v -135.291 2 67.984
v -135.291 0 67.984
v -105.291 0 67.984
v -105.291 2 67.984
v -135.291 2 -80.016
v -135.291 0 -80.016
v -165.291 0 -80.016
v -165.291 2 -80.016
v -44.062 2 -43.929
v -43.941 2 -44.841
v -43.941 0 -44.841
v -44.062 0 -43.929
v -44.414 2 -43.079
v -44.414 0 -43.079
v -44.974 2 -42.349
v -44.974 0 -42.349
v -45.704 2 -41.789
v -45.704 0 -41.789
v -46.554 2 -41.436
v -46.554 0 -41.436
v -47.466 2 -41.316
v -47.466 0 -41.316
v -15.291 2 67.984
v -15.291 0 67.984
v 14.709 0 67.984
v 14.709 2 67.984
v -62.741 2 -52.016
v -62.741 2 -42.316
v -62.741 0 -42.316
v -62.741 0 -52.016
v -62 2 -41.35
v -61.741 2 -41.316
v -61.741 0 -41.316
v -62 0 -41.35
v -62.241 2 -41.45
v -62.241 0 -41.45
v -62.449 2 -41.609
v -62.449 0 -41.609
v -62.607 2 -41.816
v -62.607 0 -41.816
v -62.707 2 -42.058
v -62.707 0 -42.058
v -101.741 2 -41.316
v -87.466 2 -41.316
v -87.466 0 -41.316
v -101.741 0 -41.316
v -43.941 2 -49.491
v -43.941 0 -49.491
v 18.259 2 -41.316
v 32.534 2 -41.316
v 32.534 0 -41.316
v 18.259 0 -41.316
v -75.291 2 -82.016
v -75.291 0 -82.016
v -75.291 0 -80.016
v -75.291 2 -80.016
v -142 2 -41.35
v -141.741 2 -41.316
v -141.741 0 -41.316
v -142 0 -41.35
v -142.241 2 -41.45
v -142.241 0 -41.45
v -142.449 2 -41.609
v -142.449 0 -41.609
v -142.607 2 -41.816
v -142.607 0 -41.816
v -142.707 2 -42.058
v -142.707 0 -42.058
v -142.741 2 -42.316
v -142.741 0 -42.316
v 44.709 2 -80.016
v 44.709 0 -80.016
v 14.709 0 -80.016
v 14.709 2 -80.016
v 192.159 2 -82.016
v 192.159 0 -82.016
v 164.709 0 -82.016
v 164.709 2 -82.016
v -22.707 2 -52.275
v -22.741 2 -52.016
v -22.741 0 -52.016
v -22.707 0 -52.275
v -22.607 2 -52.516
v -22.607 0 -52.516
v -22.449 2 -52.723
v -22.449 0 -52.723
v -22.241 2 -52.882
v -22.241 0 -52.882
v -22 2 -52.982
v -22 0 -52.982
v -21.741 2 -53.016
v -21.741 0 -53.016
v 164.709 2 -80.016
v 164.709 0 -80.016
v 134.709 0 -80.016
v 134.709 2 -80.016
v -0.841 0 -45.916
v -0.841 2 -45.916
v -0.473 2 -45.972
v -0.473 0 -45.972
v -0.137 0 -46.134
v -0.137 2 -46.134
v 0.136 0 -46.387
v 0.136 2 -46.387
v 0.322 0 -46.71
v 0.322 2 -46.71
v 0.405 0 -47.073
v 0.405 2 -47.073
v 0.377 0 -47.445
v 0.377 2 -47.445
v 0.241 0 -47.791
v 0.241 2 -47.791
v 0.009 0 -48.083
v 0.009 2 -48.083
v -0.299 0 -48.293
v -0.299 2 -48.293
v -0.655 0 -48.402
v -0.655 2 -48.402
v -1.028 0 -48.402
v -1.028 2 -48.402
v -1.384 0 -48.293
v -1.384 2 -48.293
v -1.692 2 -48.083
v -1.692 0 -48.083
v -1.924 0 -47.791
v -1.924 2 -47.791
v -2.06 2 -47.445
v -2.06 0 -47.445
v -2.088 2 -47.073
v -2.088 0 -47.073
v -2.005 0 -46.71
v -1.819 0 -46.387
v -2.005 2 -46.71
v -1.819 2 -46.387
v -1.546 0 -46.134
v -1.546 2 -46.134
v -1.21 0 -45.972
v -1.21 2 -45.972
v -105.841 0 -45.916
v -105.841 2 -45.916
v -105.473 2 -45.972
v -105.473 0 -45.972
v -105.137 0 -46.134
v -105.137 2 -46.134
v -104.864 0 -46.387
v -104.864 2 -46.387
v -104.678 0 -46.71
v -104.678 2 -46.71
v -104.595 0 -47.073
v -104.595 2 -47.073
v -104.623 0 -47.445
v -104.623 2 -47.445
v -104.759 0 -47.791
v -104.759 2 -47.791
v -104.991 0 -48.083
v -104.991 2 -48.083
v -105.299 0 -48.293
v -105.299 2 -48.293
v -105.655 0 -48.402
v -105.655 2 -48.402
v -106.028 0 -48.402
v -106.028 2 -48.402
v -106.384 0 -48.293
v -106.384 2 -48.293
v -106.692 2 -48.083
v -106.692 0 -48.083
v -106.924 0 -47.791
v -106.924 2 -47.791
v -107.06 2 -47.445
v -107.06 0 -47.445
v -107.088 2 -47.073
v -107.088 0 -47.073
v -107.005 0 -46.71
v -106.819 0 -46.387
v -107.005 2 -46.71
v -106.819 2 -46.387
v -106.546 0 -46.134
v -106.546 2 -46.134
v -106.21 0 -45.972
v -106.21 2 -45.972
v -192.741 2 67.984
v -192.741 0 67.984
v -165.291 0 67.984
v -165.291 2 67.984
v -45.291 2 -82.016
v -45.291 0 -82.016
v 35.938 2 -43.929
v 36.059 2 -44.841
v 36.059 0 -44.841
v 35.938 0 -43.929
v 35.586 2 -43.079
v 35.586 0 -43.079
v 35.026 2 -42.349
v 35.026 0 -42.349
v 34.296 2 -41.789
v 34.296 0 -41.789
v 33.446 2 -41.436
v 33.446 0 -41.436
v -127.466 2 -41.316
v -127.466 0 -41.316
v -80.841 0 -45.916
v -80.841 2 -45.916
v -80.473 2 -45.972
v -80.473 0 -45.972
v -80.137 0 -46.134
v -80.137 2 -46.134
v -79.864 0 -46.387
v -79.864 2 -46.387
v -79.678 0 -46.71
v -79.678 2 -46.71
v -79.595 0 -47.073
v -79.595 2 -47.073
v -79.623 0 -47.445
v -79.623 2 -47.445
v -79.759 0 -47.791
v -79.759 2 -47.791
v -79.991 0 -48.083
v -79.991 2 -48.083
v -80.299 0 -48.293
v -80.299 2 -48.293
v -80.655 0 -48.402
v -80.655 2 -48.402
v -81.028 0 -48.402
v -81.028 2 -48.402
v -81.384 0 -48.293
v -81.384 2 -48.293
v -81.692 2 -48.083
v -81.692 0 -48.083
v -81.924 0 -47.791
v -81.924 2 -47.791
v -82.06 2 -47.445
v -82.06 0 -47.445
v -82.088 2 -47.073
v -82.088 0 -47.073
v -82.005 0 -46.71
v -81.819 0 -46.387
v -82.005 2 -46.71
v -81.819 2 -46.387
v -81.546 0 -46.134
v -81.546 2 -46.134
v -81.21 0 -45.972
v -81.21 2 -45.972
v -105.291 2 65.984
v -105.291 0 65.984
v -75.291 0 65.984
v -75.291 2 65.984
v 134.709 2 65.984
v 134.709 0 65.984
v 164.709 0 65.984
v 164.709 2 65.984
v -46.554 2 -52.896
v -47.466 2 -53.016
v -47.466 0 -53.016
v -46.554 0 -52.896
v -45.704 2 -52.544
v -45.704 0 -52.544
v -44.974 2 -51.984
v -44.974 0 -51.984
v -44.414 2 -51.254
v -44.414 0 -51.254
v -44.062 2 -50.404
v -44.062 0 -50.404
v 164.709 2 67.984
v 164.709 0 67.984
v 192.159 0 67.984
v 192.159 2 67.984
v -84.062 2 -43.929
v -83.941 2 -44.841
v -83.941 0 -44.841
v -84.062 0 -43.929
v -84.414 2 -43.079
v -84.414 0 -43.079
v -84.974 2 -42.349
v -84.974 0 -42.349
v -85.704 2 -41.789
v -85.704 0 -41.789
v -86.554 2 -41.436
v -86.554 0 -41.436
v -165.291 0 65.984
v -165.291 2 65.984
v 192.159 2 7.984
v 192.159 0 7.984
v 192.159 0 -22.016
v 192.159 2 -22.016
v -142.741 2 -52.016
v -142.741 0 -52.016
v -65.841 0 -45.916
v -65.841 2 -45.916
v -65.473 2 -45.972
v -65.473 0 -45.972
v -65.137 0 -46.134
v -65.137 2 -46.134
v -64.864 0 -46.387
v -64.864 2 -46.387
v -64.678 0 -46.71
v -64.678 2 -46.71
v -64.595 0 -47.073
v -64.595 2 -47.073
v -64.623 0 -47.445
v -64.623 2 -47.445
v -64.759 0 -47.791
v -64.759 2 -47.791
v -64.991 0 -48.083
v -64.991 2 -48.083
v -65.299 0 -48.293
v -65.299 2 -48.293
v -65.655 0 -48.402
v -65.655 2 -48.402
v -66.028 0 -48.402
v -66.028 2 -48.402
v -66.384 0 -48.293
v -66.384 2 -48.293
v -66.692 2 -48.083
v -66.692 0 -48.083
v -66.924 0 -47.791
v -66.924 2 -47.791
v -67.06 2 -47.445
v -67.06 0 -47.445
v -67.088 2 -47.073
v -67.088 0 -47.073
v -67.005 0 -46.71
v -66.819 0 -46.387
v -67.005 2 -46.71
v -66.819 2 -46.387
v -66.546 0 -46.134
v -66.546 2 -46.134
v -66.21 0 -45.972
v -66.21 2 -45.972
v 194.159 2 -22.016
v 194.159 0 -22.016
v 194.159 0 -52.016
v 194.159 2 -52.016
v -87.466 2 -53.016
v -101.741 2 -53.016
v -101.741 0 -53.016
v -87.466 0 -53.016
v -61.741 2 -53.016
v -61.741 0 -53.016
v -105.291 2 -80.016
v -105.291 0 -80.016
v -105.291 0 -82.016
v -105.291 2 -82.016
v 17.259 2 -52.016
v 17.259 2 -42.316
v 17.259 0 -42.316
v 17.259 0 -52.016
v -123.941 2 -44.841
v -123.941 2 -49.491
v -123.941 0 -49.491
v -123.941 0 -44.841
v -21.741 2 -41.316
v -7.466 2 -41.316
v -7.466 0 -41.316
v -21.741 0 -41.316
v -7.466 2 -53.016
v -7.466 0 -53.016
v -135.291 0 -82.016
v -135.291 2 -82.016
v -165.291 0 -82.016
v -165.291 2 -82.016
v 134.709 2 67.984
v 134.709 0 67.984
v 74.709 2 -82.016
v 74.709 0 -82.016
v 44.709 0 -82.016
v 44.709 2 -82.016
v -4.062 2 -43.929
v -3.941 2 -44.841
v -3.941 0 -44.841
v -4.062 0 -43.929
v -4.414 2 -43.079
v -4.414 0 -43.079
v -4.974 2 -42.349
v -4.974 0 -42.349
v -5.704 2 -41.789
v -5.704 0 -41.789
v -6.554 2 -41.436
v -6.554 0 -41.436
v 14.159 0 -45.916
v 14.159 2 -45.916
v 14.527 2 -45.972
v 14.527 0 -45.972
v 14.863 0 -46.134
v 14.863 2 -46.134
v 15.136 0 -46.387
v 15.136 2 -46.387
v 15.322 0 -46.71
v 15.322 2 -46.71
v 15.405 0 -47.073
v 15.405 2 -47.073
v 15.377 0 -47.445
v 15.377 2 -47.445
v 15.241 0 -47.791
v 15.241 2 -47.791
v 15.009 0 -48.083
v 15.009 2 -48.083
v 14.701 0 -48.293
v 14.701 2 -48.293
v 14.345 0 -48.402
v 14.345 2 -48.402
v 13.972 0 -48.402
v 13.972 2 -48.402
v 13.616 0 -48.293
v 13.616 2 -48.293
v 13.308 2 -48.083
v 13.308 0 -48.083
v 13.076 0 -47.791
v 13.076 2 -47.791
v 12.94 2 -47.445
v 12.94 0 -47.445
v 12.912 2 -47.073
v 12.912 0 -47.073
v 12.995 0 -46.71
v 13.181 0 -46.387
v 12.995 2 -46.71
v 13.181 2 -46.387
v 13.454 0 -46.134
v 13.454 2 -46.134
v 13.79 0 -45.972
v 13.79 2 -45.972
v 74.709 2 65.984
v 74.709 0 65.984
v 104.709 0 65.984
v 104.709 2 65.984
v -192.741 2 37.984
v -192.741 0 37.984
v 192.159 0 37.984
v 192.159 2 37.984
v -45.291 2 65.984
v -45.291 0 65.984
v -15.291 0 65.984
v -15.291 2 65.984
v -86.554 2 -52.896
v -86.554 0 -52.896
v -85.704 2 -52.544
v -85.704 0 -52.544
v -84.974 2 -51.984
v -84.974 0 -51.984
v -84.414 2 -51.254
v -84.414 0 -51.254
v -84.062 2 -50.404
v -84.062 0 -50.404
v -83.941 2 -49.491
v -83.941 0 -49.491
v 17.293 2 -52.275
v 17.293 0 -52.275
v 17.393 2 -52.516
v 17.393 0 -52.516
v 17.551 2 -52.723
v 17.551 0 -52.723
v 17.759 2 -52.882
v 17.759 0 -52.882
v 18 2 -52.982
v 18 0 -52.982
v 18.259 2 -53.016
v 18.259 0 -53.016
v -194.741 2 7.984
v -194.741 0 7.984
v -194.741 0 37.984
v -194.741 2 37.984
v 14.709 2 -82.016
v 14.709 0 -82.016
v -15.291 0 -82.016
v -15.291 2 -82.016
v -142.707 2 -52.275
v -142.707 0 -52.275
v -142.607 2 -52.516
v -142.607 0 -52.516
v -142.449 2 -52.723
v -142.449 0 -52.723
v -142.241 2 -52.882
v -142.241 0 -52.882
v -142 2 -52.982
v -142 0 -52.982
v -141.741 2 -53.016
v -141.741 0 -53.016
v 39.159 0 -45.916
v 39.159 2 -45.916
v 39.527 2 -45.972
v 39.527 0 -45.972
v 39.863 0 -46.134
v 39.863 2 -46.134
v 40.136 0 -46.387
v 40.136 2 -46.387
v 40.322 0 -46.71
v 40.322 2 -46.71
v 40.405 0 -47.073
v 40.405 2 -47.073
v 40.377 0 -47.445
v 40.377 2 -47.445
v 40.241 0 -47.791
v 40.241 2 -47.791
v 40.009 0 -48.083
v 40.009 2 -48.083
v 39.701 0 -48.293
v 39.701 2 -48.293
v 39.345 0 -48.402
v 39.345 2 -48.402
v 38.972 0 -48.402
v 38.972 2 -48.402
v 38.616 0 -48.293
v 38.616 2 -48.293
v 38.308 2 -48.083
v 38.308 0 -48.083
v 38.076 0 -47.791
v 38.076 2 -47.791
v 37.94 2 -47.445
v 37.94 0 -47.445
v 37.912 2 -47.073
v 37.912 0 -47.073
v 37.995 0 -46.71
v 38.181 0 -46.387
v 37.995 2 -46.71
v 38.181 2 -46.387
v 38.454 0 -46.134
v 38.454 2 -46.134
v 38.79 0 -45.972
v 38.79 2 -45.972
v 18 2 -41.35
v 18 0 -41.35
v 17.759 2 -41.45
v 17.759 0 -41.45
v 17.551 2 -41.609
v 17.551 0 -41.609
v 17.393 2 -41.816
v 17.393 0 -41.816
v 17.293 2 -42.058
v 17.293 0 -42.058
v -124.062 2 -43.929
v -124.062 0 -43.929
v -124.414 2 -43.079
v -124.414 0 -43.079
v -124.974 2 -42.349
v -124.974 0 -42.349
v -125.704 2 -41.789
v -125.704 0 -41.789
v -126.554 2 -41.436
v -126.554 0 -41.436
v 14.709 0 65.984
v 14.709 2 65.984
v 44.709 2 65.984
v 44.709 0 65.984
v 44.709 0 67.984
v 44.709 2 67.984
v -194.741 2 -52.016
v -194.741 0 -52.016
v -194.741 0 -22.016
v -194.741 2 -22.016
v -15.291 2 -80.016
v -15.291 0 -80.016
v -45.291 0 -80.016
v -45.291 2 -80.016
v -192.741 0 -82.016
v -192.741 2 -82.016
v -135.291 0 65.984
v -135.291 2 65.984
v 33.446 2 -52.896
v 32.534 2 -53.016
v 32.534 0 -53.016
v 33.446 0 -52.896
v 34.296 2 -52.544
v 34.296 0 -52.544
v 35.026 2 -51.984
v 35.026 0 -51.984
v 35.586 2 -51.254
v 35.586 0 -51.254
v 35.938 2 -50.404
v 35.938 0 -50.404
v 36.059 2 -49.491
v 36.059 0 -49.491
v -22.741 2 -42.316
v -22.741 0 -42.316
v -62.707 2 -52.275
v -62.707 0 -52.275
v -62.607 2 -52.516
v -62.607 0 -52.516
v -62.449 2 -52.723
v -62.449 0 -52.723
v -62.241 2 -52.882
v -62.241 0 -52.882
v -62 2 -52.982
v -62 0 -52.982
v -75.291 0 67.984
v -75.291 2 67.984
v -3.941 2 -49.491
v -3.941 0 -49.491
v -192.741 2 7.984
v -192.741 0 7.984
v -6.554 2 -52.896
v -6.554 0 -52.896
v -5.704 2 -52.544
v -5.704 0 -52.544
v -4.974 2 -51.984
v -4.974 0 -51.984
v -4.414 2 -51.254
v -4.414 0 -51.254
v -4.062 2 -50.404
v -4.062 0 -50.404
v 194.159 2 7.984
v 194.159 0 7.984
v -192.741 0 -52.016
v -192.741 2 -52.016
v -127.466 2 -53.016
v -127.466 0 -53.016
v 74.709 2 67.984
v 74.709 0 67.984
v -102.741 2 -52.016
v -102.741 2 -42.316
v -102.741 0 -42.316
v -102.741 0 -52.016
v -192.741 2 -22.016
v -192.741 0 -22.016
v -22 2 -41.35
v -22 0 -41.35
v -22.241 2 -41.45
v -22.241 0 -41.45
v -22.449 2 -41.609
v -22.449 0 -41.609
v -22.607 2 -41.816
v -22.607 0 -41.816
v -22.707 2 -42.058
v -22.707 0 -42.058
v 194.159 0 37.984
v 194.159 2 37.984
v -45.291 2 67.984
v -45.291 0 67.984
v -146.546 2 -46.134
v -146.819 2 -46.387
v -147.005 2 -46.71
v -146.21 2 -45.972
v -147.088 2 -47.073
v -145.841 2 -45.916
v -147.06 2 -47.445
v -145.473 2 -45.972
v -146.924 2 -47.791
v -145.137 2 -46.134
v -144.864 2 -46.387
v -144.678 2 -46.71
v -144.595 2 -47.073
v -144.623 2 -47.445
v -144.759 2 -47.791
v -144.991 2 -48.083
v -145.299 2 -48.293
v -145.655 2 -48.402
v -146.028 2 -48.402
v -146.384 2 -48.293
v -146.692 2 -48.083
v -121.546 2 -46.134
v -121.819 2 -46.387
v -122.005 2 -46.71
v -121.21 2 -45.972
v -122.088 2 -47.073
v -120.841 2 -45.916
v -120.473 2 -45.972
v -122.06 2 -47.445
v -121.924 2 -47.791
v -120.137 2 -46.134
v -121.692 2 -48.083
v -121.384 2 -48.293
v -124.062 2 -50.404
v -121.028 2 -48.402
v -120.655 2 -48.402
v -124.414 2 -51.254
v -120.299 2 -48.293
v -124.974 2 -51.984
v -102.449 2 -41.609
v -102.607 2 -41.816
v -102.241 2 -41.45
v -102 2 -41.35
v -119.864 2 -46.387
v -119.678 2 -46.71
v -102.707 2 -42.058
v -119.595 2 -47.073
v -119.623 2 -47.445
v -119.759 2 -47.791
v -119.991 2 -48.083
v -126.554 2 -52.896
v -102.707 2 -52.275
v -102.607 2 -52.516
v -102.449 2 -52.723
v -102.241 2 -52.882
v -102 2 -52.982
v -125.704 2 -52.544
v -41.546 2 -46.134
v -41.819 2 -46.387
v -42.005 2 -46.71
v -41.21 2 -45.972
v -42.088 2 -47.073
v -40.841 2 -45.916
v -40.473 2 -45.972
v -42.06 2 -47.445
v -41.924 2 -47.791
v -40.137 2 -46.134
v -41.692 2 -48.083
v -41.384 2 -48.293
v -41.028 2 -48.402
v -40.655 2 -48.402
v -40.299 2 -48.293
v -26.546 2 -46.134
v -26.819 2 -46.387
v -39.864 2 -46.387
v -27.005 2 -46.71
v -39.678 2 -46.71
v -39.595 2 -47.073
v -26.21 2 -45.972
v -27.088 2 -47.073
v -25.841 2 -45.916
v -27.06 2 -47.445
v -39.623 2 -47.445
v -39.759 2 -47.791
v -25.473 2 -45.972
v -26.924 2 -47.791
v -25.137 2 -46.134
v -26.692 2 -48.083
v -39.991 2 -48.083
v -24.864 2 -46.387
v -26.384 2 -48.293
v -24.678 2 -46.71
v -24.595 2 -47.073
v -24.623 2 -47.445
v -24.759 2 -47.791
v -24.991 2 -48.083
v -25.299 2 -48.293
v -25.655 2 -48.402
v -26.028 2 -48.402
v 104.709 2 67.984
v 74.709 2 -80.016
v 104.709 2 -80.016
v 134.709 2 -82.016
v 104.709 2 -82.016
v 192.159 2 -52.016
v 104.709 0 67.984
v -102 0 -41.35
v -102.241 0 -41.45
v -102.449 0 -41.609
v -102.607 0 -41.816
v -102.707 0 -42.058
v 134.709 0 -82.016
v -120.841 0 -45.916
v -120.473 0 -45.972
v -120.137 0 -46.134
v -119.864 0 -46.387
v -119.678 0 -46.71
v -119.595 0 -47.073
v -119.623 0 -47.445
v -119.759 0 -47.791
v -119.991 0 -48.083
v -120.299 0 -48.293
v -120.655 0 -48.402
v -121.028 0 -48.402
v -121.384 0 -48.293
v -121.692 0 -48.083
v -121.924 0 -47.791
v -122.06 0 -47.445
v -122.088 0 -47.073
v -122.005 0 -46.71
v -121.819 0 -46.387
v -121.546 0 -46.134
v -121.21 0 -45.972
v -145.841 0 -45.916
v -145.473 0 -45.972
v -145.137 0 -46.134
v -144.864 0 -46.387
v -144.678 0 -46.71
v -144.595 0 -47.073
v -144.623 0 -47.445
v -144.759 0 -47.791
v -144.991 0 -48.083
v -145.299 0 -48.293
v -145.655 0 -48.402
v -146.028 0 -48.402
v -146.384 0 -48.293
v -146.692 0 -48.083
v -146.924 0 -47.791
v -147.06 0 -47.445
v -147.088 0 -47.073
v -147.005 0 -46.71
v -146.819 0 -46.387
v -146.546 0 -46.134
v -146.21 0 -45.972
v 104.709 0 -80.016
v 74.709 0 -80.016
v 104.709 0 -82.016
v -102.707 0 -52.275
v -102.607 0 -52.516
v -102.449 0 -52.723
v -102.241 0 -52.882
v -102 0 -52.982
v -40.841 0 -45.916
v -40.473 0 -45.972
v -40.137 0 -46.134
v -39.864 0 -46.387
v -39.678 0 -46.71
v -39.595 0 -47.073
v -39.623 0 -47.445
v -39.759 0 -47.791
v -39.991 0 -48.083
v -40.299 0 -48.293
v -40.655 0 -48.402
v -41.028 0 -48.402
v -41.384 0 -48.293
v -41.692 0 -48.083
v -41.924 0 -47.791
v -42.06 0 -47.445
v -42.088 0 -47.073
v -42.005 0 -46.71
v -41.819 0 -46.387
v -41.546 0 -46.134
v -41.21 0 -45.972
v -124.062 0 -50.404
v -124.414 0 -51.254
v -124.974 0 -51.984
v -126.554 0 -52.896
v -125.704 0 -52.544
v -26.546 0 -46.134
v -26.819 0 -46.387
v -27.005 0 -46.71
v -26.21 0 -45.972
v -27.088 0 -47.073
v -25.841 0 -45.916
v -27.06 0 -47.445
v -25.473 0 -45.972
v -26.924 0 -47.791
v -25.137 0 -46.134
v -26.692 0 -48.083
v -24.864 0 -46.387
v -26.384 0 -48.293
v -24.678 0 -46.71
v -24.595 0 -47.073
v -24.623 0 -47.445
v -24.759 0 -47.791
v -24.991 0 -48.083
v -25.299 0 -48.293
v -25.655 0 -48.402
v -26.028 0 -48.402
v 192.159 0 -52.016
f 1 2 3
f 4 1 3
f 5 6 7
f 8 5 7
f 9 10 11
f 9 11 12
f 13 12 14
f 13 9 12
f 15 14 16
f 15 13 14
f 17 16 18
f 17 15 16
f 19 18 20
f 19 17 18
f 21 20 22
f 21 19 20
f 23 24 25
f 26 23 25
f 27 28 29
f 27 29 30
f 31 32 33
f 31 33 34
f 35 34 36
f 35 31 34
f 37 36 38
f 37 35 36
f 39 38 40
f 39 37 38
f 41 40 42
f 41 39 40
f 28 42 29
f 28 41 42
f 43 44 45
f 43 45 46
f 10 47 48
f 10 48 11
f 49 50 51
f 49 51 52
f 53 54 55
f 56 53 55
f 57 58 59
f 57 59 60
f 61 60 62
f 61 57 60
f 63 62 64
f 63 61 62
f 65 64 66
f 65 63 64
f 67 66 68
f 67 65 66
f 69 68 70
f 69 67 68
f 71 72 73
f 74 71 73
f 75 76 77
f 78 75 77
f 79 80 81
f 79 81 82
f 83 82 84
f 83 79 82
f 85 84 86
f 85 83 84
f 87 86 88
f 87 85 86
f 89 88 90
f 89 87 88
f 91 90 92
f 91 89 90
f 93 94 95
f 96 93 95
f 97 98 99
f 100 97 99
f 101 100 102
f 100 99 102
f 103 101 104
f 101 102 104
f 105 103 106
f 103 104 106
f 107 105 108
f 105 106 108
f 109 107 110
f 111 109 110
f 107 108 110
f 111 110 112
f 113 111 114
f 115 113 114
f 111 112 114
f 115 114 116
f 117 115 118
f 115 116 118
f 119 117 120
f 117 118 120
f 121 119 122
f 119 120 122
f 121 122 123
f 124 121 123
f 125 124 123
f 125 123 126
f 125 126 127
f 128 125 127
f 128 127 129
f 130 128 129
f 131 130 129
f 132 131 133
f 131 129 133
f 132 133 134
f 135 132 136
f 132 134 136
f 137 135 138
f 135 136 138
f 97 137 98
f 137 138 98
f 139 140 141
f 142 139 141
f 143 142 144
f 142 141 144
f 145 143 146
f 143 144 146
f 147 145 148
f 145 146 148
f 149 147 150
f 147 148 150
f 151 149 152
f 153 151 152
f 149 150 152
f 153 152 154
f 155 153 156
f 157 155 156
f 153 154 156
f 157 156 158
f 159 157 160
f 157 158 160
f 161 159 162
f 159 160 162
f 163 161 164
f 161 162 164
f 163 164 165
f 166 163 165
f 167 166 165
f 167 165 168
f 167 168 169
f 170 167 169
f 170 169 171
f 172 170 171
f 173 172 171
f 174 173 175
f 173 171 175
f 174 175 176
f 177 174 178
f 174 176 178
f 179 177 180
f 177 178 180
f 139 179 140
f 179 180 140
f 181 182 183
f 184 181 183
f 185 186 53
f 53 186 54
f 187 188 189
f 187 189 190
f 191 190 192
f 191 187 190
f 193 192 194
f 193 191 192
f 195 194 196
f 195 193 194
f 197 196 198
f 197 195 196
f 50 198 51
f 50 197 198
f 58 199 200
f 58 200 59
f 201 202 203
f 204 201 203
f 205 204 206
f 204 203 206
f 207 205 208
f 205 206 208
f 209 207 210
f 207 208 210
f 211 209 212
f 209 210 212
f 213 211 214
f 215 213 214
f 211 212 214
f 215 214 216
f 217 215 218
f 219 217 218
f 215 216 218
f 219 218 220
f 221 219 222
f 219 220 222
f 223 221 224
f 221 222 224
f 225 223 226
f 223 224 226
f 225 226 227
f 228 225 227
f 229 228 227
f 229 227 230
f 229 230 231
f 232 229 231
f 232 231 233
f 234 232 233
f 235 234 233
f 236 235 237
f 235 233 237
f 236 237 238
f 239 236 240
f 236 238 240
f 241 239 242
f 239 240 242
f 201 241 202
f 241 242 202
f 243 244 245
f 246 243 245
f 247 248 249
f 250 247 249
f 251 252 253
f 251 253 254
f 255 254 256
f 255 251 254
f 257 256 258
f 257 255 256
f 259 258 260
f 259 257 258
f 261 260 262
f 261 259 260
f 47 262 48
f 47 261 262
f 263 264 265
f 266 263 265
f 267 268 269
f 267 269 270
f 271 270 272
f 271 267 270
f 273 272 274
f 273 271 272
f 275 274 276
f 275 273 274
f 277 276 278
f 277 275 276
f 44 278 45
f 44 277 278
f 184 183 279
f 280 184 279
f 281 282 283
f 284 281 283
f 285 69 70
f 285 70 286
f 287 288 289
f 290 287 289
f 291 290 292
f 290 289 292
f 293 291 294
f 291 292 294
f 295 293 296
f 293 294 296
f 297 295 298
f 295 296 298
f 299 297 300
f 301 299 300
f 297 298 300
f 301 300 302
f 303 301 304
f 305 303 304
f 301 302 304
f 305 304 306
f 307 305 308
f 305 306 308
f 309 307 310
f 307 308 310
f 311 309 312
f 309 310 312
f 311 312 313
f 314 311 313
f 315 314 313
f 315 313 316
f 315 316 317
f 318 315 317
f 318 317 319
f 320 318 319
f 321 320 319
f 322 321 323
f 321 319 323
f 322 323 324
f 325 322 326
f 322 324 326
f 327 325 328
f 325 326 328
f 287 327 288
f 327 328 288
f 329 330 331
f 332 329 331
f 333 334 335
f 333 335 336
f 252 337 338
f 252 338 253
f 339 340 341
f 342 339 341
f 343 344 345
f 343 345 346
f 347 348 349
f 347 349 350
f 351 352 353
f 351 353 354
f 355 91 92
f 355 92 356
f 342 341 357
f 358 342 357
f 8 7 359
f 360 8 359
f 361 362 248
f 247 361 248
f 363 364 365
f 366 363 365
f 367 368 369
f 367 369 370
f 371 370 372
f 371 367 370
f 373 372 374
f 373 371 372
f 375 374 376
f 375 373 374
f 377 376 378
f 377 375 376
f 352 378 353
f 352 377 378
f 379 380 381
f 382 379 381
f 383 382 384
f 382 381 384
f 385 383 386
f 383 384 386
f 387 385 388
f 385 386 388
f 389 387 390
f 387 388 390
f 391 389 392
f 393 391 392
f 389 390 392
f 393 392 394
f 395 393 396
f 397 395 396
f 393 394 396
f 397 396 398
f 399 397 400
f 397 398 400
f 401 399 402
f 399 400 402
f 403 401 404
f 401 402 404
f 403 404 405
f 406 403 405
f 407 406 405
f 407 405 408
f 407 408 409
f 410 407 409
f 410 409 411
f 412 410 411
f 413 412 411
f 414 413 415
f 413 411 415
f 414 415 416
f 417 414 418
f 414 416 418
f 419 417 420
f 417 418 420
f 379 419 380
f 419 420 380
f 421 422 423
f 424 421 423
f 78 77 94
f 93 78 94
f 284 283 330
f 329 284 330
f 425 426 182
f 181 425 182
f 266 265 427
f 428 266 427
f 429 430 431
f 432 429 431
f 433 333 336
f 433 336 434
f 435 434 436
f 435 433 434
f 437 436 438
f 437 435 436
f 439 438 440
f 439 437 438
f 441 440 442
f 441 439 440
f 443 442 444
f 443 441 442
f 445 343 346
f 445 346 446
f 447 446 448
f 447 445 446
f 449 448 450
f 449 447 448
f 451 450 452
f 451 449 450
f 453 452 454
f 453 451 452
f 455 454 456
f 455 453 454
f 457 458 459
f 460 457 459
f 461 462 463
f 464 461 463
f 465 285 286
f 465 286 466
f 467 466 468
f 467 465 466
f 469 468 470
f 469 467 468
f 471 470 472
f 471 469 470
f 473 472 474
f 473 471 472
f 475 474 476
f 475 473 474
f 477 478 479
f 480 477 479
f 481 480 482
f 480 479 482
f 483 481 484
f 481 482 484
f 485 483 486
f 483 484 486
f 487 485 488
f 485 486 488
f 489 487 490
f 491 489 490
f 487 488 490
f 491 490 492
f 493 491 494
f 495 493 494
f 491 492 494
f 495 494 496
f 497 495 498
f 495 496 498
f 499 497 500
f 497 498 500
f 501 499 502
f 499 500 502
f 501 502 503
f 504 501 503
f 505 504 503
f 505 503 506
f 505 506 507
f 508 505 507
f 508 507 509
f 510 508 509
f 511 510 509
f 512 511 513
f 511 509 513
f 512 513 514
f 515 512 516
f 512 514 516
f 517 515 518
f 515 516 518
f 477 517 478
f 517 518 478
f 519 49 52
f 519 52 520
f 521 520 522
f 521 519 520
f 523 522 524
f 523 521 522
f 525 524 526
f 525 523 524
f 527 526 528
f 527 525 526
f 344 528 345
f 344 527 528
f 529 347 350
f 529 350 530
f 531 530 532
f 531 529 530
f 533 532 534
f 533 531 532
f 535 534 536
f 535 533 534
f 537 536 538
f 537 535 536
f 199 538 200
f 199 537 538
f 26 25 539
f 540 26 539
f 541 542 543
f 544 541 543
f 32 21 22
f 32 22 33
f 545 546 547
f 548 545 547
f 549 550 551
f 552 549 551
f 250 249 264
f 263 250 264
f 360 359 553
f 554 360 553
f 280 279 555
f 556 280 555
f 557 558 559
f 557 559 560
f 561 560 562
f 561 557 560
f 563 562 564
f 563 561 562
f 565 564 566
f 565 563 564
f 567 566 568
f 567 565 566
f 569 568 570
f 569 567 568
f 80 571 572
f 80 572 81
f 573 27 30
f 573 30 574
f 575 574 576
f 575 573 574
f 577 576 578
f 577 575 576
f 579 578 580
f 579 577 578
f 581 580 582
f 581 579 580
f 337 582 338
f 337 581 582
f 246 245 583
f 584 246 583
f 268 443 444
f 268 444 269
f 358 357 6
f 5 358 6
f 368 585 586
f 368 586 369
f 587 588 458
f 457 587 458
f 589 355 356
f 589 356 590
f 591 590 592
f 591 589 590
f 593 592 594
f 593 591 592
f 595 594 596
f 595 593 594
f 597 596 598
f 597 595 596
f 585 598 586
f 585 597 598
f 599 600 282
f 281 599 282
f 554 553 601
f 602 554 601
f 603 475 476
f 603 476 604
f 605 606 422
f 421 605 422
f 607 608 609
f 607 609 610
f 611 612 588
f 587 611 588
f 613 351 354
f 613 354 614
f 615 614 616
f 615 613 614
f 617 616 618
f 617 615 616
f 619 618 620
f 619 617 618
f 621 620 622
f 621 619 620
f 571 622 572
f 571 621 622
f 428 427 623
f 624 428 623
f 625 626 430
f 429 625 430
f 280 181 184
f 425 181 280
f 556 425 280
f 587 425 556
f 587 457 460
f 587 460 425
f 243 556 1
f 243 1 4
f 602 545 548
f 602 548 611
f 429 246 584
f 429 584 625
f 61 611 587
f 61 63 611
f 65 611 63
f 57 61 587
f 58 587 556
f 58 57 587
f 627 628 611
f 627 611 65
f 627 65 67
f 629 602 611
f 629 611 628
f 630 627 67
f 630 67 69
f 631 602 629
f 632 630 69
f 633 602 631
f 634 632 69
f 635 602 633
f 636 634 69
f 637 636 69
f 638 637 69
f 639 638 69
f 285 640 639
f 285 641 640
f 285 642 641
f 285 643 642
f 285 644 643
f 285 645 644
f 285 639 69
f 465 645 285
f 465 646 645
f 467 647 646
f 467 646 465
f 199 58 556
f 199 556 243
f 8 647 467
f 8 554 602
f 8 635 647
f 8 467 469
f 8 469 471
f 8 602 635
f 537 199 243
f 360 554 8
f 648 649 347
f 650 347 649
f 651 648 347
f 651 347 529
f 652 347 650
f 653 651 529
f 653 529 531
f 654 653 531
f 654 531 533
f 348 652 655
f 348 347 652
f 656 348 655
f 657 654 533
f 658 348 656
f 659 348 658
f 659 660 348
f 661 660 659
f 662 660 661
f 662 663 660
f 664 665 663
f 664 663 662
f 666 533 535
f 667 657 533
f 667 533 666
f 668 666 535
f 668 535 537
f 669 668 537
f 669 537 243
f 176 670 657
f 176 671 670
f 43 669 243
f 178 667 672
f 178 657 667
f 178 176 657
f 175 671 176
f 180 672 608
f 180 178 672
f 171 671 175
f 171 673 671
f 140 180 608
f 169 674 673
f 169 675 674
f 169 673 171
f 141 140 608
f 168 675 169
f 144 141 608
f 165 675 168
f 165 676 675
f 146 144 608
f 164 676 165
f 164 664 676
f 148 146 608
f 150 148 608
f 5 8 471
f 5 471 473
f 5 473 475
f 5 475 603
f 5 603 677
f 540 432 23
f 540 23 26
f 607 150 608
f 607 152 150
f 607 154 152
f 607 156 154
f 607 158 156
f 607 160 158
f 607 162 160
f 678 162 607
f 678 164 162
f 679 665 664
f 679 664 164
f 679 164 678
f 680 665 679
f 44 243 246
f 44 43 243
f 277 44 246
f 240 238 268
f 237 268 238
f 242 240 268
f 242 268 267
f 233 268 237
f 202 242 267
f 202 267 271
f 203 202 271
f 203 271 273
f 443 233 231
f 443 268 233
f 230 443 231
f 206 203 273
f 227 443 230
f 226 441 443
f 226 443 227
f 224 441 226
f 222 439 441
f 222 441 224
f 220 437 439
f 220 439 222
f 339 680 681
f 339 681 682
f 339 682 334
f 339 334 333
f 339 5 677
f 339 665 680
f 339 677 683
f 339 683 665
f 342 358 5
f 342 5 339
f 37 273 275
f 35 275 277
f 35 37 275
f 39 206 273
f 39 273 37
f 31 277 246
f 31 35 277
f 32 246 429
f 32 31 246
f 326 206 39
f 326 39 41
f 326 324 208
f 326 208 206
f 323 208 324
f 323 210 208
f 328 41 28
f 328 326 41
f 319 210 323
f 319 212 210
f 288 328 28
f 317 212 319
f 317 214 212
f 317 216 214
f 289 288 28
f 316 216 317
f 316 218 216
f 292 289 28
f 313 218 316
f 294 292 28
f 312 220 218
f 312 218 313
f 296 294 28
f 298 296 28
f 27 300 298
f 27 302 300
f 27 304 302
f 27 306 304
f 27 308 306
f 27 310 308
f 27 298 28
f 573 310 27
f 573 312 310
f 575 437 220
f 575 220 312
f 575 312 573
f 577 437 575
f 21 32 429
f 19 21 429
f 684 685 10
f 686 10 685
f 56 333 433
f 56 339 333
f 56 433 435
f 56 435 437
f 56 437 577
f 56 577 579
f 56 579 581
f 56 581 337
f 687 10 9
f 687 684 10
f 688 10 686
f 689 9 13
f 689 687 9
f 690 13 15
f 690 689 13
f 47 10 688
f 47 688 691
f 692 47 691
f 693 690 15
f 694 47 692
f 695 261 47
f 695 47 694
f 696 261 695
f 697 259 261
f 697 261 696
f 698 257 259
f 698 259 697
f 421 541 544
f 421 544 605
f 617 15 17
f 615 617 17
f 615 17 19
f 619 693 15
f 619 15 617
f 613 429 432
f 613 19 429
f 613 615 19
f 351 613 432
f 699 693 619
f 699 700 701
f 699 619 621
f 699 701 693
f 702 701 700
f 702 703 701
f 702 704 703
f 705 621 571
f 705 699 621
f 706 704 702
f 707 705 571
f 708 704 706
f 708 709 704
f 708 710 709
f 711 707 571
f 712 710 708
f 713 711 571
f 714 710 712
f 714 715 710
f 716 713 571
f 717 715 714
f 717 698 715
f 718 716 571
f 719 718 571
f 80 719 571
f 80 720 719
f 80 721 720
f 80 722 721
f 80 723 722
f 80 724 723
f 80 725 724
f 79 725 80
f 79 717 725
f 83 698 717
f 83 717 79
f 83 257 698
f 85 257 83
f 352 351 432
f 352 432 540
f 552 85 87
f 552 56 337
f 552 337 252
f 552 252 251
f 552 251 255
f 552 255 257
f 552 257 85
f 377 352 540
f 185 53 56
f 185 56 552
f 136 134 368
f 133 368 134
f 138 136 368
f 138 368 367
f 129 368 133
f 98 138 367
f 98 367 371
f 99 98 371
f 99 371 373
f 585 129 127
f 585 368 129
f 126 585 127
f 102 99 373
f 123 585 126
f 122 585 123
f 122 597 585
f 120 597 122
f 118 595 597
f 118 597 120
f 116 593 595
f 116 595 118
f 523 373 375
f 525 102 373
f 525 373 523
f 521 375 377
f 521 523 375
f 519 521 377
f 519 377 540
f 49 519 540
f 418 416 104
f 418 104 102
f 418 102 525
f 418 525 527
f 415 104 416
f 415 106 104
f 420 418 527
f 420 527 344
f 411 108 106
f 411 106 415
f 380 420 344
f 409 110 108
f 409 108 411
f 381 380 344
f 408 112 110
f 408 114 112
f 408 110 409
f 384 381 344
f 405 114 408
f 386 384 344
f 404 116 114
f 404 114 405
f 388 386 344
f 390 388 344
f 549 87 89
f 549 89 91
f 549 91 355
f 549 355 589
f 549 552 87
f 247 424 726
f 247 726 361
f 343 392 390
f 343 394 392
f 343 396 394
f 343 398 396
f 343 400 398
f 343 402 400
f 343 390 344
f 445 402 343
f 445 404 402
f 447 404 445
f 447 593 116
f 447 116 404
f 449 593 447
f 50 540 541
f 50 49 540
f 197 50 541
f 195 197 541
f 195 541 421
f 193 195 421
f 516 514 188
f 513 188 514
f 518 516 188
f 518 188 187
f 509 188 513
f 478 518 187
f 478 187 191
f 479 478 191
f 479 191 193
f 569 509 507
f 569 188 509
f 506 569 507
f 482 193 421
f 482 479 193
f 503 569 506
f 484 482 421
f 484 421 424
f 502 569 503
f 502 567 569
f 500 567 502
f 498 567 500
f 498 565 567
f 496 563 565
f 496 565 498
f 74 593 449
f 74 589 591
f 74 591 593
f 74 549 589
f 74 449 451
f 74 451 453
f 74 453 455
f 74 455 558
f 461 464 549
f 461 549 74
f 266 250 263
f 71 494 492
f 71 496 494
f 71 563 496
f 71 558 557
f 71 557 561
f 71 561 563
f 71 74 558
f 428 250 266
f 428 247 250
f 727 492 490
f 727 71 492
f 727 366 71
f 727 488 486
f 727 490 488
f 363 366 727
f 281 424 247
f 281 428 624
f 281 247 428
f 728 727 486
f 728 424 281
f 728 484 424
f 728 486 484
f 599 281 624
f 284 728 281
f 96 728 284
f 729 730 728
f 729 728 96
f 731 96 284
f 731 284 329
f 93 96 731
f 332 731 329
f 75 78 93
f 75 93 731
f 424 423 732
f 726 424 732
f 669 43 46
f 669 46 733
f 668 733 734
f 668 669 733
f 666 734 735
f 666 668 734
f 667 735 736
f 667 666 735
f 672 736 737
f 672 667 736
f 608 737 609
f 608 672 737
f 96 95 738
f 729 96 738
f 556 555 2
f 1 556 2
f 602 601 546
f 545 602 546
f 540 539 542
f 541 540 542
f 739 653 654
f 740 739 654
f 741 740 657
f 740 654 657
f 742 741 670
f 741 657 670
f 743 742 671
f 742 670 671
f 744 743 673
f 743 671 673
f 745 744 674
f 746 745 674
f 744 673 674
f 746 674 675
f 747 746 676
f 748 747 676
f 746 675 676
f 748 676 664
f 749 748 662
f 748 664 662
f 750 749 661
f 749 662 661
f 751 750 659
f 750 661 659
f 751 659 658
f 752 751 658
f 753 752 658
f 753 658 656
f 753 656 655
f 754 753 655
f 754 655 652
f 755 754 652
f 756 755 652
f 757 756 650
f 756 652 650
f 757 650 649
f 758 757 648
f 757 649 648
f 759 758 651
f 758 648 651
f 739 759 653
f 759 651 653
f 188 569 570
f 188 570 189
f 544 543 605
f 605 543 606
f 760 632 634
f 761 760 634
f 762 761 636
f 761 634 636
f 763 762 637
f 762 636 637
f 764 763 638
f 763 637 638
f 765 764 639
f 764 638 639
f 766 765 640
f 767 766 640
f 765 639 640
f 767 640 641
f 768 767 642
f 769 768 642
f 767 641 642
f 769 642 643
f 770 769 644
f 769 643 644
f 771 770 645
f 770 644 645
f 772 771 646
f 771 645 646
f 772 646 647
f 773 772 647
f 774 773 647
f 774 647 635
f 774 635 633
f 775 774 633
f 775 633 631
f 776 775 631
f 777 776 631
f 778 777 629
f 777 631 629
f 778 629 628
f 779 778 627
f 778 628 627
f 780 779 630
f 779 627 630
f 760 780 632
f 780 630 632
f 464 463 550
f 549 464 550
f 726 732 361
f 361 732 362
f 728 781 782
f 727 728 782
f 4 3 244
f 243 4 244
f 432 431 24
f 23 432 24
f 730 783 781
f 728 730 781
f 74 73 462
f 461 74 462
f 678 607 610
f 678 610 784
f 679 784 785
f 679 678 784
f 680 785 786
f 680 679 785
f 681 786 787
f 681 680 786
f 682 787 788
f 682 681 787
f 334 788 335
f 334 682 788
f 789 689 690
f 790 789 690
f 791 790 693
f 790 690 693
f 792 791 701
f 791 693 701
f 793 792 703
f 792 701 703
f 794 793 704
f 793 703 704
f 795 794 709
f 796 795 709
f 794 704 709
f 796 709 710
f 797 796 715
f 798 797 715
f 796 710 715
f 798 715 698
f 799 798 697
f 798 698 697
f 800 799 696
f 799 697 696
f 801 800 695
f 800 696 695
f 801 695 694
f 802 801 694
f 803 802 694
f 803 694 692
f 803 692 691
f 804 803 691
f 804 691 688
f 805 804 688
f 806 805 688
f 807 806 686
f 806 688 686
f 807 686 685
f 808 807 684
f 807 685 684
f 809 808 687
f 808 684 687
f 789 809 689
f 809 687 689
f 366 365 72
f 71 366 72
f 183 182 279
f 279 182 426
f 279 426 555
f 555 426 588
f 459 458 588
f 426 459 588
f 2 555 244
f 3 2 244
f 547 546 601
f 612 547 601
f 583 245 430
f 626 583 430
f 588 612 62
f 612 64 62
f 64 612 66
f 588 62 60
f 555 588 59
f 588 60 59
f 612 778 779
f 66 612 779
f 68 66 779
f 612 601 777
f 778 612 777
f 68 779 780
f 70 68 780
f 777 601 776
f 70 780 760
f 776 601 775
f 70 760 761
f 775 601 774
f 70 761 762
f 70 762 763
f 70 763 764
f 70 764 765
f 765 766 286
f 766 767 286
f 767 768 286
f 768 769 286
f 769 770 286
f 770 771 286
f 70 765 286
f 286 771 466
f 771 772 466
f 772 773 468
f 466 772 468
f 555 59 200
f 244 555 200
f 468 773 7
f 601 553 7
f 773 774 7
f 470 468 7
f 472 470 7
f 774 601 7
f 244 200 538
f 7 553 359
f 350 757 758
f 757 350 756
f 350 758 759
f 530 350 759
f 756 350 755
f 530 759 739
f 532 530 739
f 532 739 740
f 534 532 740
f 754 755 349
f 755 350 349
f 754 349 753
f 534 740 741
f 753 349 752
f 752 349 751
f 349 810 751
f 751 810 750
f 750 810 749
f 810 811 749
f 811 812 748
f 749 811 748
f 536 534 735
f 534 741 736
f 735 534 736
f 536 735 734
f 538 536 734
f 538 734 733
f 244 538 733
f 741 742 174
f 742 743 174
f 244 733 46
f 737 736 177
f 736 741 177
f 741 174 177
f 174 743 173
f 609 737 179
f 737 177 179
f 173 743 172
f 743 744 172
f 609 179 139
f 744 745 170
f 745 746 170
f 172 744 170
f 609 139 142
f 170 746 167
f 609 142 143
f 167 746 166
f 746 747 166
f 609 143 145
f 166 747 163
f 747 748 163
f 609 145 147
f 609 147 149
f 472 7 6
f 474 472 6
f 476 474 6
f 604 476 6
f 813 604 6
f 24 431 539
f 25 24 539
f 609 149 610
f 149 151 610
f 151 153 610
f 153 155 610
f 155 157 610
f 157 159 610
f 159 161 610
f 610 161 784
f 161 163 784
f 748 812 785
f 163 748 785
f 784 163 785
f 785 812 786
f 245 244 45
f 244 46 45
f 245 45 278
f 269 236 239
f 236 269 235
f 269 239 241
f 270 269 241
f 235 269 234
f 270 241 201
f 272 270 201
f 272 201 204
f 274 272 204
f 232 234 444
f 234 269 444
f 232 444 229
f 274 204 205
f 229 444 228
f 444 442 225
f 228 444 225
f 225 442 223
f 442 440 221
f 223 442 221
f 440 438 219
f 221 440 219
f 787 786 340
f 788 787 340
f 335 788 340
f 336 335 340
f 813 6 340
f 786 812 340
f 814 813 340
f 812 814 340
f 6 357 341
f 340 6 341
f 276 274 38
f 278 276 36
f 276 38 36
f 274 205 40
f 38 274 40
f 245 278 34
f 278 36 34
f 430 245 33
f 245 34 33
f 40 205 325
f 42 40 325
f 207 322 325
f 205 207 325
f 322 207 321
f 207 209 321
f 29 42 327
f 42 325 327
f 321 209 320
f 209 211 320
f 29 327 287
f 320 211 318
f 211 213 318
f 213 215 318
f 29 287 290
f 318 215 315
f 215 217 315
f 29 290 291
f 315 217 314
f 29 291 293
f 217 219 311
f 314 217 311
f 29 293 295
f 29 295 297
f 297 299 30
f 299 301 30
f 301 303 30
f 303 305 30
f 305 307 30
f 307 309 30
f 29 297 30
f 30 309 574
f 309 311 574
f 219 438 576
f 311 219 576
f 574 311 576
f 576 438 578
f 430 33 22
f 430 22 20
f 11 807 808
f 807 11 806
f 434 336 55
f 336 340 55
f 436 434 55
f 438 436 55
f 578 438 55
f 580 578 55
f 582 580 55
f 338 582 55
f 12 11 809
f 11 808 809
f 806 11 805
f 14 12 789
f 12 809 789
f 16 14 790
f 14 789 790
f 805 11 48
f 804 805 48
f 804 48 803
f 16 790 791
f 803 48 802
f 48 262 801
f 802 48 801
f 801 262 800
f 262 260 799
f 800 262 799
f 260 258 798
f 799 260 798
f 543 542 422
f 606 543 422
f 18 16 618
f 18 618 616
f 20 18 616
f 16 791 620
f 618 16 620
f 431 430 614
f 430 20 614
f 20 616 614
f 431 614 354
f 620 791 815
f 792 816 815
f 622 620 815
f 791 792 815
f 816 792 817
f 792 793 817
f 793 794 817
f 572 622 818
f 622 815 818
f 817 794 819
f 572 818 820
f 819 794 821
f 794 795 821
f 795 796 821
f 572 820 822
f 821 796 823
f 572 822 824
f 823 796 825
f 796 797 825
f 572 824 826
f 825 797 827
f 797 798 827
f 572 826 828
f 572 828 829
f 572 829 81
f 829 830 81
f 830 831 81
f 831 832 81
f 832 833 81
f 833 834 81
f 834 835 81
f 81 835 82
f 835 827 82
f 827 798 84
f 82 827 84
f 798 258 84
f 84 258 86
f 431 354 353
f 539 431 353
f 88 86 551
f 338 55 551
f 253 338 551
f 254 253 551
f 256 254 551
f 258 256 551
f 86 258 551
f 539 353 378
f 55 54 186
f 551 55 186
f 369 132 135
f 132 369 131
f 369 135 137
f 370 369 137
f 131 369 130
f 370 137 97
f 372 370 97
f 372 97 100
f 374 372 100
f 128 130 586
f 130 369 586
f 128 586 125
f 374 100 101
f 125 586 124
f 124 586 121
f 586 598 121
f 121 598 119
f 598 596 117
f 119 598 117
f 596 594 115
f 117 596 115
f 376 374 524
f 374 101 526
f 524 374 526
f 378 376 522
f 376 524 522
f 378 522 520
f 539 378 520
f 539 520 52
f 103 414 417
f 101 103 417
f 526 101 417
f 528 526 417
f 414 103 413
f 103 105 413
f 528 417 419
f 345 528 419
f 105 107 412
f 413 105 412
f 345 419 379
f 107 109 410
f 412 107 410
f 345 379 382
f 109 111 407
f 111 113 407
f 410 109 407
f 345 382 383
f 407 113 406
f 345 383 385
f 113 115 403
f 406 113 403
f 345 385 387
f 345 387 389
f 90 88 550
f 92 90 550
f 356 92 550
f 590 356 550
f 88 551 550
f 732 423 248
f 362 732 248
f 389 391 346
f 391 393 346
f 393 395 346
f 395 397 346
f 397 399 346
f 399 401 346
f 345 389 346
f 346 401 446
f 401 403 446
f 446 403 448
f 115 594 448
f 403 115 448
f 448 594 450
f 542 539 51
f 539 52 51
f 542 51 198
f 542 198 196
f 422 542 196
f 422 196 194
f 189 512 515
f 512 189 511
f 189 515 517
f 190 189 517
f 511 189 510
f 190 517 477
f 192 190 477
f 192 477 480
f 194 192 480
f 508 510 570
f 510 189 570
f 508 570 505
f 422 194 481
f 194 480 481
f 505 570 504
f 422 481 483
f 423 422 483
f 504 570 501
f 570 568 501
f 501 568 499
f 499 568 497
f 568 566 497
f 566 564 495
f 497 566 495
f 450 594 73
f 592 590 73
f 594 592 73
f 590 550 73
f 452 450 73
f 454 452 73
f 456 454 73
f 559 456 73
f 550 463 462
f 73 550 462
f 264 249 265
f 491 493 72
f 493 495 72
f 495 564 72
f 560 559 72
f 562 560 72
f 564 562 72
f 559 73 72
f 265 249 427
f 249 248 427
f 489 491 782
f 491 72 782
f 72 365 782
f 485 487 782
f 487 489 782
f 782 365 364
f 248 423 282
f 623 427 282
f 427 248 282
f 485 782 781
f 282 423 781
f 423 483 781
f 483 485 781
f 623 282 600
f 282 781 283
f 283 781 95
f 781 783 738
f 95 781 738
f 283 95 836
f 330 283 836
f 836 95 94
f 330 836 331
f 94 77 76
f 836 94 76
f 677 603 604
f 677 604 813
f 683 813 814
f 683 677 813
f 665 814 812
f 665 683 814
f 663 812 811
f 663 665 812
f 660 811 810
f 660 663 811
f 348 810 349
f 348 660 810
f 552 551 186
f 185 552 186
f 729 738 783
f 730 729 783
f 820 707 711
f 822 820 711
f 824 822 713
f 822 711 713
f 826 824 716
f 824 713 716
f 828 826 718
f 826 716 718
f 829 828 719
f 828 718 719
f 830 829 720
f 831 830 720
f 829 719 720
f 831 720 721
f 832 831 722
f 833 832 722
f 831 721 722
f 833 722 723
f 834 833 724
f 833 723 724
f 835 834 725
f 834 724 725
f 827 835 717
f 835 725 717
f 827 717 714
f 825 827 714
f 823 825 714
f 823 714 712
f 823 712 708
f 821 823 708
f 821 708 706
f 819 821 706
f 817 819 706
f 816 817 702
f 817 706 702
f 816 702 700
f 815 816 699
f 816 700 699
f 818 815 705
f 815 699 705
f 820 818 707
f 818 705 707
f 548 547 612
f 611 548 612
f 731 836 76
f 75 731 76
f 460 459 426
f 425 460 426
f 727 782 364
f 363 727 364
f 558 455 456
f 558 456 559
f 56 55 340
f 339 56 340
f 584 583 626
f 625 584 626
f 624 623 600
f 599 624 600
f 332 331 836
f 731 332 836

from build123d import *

# Parameters (mm, degrees)
BOSS_EXTRUDE1_DEPTH = 2
SKETCH3_R           = 1.25
CUT_EXTRUDE1_DEPTH  = 2


with BuildPart() as part:
    # Sketch1 → Boss-Extrude1 (new body)
    with BuildSketch(Plane(origin=(0, 0, 0), x_dir=(1, 0, 0), z_dir=(0, 1, 0))):
        Polygon((192.158560219, 82.016387154), (164.708560219, 82.016387154), (164.708560219, 80.016387154), (134.708560219, 80.016387154), (134.708560219, 82.016387154), (104.708560219, 82.016387154), (104.708560219, 80.016387154), (74.708560219, 80.016387154), (74.708560219, 82.016387154), (44.708560219, 82.016387154), (44.708560219, 80.016387154), (14.708560219, 80.016387154), (14.708560219, 82.016387154), (-15.291439781, 82.016387154), (-15.291439781, 80.016387154), (-45.291439781, 80.016387154), (-45.291439781, 82.016387154), (-75.291439781, 82.016387154), (-75.291439781, 80.016387154), (-105.291439781, 80.016387154), (-105.291439781, 82.016387154), (-135.291439781, 82.016387154), (-135.291439781, 80.016387154), (-165.291439781, 80.016387154), (-165.291439781, 82.016387154), (-192.741439781, 82.016387154), (-192.741439781, 80.016387154), (-192.741439781, 52.016387154), (-194.741439781, 52.016387154), (-194.741439781, 22.016387154), (-192.741439781, 22.016387154), (-192.741439781, -7.983612846), (-194.741439781, -7.983612846), (-194.741439781, -37.983612846), (-192.741439781, -37.983612846), (-192.741439781, -65.983612846), (-192.741439781, -67.983612846), (-165.291439781, -67.983612846), (-165.291439781, -65.983612846), (-135.291439781, -65.983612846), (-135.291439781, -67.983612846), (-105.291439781, -67.983612846), (-105.291439781, -65.983612846), (-75.291439781, -65.983612846), (-75.291439781, -67.983612846), (-45.291439781, -67.983612846), (-45.291439781, -65.983612846), (-15.291439781, -65.983612846), (-15.291439781, -67.983612846), (14.708560219, -67.983612846), (14.708560219, -65.983612846), (44.708560219, -65.983612846), (44.708560219, -67.983612846), (74.708560219, -67.983612846), (74.708560219, -65.983612846), (104.708560219, -65.983612846), (104.708560219, -67.983612846), (134.708560219, -67.983612846), (134.708560219, -65.983612846), (164.708560219, -65.983612846), (164.708560219, -67.983612846), (192.158560219, -67.983612846), (192.158560219, -65.983612846), (192.158560219, -37.983612846), (194.158560219, -37.983612846), (194.158560219, -7.983612846), (192.158560219, -7.983612846), (192.158560219, 22.016387154), (194.158560219, 22.016387154), (194.158560219, 52.016387154), (192.158560219, 52.016387154), (192.158560219, 80.016387154), align=None)
    extrude(amount=BOSS_EXTRUDE1_DEPTH)

    # Sketch3 → Cut-Extrude1 (cut)
    with BuildSketch(Plane(origin=(0, 2, 0), x_dir=(1, 0, 0), z_dir=(0, 1, 0))):
        with Locations(Location((-145.841439781, 47.166387154, 0), (0, 0, 270))):
            Circle(SKETCH3_R)
        with Locations(Location((-120.841439781, 47.166387154, 0), (0, 0, 270))):
            Circle(SKETCH3_R)
        with Locations(Location((-105.841439781, 47.166387154, 0), (0, 0, 270))):
            Circle(SKETCH3_R)
        with Locations(Location((-80.841439781, 47.166387154, 0), (0, 0, 270))):
            Circle(SKETCH3_R)
        with Locations(Location((-65.841439781, 47.166387154, 0), (0, 0, 270))):
            Circle(SKETCH3_R)
        with Locations(Location((-40.841439781, 47.166387154, 0), (0, 0, 270))):
            Circle(SKETCH3_R)
        with Locations(Location((-25.841439781, 47.166387154, 0), (0, 0, 270))):
            Circle(SKETCH3_R)
        with Locations(Location((-0.841439781, 47.166387154, 0), (0, 0, 270))):
            Circle(SKETCH3_R)
        with Locations(Location((14.158560219, 47.166387154, 0), (0, 0, 270))):
            Circle(SKETCH3_R)
        with Locations(Location((39.158560219, 47.166387154, 0), (0, 0, 270))):
            Circle(SKETCH3_R)
        with BuildLine():
            Line((-127.466439781, 41.316387154), (-141.741439781, 41.316387154))
            ThreePointArc((-141.741439781, 41.316387154), (-142.448546562, 41.609280373), (-142.741439781, 42.316387154))
            Line((-142.741439781, 42.316387154), (-142.741439781, 52.016387154))
            ThreePointArc((-142.741439781, 52.016387154), (-142.448546562, 52.723493935), (-141.741439781, 53.016387154))
            Line((-141.741439781, 53.016387154), (-127.466439781, 53.016387154))
            ThreePointArc((-127.466439781, 53.016387154), (-124.973888377, 51.983938557), (-123.941439781, 49.491387154))
            Line((-123.941439781, 49.491387154), (-123.941439781, 44.841387154))
            ThreePointArc((-123.941439781, 44.841387154), (-124.973888377, 42.34883575), (-127.466439781, 41.316387154))
        make_face()
        with BuildLine():
            Line((-87.466439781, 41.316387154), (-101.741439781, 41.316387154))
            ThreePointArc((-101.741439781, 41.316387154), (-102.448546562, 41.609280373), (-102.741439781, 42.316387154))
            Line((-102.741439781, 42.316387154), (-102.741439781, 52.016387154))
            ThreePointArc((-102.741439781, 52.016387154), (-102.448546562, 52.723493935), (-101.741439781, 53.016387154))
            Line((-101.741439781, 53.016387154), (-87.466439781, 53.016387154))
            ThreePointArc((-87.466439781, 53.016387154), (-84.973888377, 51.983938557), (-83.941439781, 49.491387154))
            Line((-83.941439781, 49.491387154), (-83.941439781, 44.841387154))
            ThreePointArc((-83.941439781, 44.841387154), (-84.973888377, 42.34883575), (-87.466439781, 41.316387154))
        make_face()
        with BuildLine():
            Line((-47.466439781, 41.316387154), (-61.741439781, 41.316387154))
            ThreePointArc((-61.741439781, 41.316387154), (-62.448546562, 41.609280373), (-62.741439781, 42.316387154))
            Line((-62.741439781, 42.316387154), (-62.741439781, 52.016387154))
            ThreePointArc((-62.741439781, 52.016387154), (-62.448546562, 52.723493935), (-61.741439781, 53.016387154))
            Line((-61.741439781, 53.016387154), (-47.466439781, 53.016387154))
            ThreePointArc((-47.466439781, 53.016387154), (-44.973888377, 51.983938557), (-43.941439781, 49.491387154))
            Line((-43.941439781, 49.491387154), (-43.941439781, 44.841387154))
            ThreePointArc((-43.941439781, 44.841387154), (-44.973888377, 42.34883575), (-47.466439781, 41.316387154))
        make_face()
        with BuildLine():
            Line((-7.466439781, 41.316387154), (-21.741439781, 41.316387154))
            ThreePointArc((-21.741439781, 41.316387154), (-22.448546562, 41.609280373), (-22.741439781, 42.316387154))
            Line((-22.741439781, 42.316387154), (-22.741439781, 52.016387154))
            ThreePointArc((-22.741439781, 52.016387154), (-22.448546562, 52.723493935), (-21.741439781, 53.016387154))
            Line((-21.741439781, 53.016387154), (-7.466439781, 53.016387154))
            ThreePointArc((-7.466439781, 53.016387154), (-4.973888377, 51.983938557), (-3.941439781, 49.491387154))
            Line((-3.941439781, 49.491387154), (-3.941439781, 44.841387154))
            ThreePointArc((-3.941439781, 44.841387154), (-4.973888377, 42.34883575), (-7.466439781, 41.316387154))
        make_face()
        with BuildLine():
            Line((32.533560219, 41.316387154), (18.258560219, 41.316387154))
            ThreePointArc((18.258560219, 41.316387154), (17.551453438, 41.609280373), (17.258560219, 42.316387154))
            Line((17.258560219, 42.316387154), (17.258560219, 52.016387154))
            ThreePointArc((17.258560219, 52.016387154), (17.551453438, 52.723493935), (18.258560219, 53.016387154))
            Line((18.258560219, 53.016387154), (32.533560219, 53.016387154))
            ThreePointArc((32.533560219, 53.016387154), (35.026111623, 51.983938557), (36.058560219, 49.491387154))
            Line((36.058560219, 49.491387154), (36.058560219, 44.841387154))
            ThreePointArc((36.058560219, 44.841387154), (35.026111623, 42.34883575), (32.533560219, 41.316387154))
        make_face()
    extrude(amount=-CUT_EXTRUDE1_DEPTH, mode=Mode.SUBTRACT)


solid = part.part
